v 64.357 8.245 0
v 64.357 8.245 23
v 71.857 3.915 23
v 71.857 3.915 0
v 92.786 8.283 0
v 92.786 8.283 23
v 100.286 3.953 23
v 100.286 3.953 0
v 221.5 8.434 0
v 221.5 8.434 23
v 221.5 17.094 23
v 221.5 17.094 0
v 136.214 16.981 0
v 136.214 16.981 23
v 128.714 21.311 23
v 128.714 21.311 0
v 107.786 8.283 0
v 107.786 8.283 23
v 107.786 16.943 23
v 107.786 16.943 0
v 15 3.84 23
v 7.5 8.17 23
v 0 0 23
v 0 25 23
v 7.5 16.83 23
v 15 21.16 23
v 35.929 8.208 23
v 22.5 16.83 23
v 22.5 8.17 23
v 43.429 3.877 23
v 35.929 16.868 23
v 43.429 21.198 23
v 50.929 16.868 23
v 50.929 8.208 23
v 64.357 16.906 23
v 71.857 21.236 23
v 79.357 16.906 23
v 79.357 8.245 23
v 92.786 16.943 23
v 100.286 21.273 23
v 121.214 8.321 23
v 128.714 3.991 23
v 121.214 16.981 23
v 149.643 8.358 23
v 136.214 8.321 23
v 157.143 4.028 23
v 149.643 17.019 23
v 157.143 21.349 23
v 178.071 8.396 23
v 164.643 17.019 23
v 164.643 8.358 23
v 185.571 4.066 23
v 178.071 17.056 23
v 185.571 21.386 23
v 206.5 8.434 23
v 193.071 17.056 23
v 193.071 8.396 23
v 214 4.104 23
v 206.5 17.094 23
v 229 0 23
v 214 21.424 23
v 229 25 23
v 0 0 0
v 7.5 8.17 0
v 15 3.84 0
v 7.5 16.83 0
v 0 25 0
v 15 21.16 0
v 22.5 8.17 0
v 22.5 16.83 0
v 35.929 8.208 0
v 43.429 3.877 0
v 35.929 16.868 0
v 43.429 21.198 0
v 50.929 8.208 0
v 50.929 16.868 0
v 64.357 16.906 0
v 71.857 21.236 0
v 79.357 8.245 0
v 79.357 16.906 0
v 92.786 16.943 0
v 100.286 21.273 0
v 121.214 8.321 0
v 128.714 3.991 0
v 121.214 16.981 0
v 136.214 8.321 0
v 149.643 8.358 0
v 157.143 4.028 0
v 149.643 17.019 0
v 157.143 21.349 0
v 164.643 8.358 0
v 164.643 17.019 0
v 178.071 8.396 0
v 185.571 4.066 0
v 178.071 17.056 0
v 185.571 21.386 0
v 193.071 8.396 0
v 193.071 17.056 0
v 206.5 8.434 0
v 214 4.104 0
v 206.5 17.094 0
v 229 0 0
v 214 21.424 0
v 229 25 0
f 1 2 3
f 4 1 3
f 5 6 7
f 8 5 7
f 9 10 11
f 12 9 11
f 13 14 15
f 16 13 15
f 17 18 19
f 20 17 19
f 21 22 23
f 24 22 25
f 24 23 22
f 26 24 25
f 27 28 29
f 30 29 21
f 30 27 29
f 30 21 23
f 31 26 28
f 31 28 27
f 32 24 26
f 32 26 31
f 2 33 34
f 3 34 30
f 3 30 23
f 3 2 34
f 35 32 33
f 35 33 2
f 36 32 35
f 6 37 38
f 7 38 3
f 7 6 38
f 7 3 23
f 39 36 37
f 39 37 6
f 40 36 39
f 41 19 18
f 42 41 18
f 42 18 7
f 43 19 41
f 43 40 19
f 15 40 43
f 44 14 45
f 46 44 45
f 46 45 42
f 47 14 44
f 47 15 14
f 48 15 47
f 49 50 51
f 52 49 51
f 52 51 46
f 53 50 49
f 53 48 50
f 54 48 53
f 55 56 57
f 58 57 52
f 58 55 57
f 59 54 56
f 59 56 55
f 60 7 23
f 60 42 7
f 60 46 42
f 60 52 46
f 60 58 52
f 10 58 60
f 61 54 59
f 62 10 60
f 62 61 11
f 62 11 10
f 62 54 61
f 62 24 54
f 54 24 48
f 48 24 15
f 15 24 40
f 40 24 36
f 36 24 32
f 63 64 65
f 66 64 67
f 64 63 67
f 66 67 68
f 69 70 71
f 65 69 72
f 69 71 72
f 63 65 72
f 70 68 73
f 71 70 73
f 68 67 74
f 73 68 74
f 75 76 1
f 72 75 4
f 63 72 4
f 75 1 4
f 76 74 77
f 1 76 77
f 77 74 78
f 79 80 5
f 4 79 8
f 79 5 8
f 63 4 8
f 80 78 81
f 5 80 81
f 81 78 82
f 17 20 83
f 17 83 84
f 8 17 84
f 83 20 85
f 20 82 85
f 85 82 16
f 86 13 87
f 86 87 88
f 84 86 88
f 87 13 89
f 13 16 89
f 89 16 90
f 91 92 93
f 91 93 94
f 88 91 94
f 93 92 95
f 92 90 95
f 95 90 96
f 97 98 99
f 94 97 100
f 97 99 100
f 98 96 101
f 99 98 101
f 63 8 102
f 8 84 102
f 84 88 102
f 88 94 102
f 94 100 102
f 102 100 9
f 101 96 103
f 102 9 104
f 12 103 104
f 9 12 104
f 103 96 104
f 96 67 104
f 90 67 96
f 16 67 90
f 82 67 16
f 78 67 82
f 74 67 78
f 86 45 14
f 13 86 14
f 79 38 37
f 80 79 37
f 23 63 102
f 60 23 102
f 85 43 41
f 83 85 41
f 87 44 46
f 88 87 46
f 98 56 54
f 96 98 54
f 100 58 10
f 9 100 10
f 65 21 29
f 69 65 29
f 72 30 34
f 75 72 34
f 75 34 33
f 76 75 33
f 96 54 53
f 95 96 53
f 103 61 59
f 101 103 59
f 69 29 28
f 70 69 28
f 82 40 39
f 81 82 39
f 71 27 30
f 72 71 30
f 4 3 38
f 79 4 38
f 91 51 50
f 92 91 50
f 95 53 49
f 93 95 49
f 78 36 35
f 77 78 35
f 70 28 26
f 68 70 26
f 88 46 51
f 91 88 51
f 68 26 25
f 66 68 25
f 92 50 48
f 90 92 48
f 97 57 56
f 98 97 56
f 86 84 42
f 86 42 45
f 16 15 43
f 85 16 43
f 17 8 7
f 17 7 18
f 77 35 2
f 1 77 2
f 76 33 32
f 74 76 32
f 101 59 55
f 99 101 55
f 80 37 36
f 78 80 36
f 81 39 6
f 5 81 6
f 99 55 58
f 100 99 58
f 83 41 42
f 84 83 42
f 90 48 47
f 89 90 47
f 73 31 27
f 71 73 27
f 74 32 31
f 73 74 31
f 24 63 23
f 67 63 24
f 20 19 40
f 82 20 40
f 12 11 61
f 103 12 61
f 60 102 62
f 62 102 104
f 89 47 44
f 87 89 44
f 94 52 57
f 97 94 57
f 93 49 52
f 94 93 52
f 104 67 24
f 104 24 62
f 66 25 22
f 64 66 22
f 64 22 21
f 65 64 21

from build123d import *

# Parameters (mm, degrees)
SKETCH1_W           = 229
SKETCH1_H           = 25
BOSS_EXTRUDE1_DEPTH = 23
CUT_EXTRUDE1_DEPTH  = 23


with BuildPart() as part:
    # Sketch1 → Boss-Extrude1 (new body)
    with BuildSketch(Plane.XY):
        with Locations((114.5, 12.5)):
            Rectangle(SKETCH1_W, SKETCH1_H)
    extrude(amount=BOSS_EXTRUDE1_DEPTH)

    # Sketch2 → Cut-Extrude1 (cut)
    with BuildSketch(Plane.XY.offset(23)):
        Polygon((43.428571429, 21.197944284), (35.928571429, 16.867817265), (35.928571429, 8.207563227), (43.428571429, 3.877436208), (50.928571429, 8.207563227), (50.928571429, 16.867817265), align=None)
        Polygon((15, 3.839745962), (22.5, 8.169872981), (22.5, 16.830127019), (15, 21.160254038), (7.5, 16.830127019), (7.5, 8.169872981), align=None)
        Polygon((71.857142857, 21.235634529), (64.357142857, 16.90550751), (64.357142857, 8.245253472), (71.857142857, 3.915126454), (79.357142857, 8.245253472), (79.357142857, 16.90550751), align=None)
        Polygon((100.285714286, 21.273324775), (92.785714286, 16.943197756), (92.785714286, 8.282943718), (100.285714286, 3.952816699), (107.785714286, 8.282943718), (107.785714286, 16.943197756), align=None)
        Polygon((128.714285714, 21.311015021), (121.214285714, 16.980888002), (121.214285714, 8.320633964), (128.714285714, 3.990506945), (136.214285714, 8.320633964), (136.214285714, 16.980888002), align=None)
        Polygon((157.142857143, 21.348705266), (149.642857143, 17.018578247), (149.642857143, 8.358324209), (157.142857143, 4.028197191), (164.642857143, 8.358324209), (164.642857143, 17.018578247), align=None)
        Polygon((185.571428571, 21.386395512), (178.071428571, 17.056268493), (178.071428571, 8.396014455), (185.571428571, 4.065887436), (193.071428571, 8.396014455), (193.071428571, 17.056268493), align=None)
        Polygon((214, 21.424085758), (206.5, 17.093958739), (206.5, 8.433704701), (214, 4.103577682), (221.5, 8.433704701), (221.5, 17.093958739), align=None)
    extrude(amount=-CUT_EXTRUDE1_DEPTH, mode=Mode.SUBTRACT)


solid = part.part
